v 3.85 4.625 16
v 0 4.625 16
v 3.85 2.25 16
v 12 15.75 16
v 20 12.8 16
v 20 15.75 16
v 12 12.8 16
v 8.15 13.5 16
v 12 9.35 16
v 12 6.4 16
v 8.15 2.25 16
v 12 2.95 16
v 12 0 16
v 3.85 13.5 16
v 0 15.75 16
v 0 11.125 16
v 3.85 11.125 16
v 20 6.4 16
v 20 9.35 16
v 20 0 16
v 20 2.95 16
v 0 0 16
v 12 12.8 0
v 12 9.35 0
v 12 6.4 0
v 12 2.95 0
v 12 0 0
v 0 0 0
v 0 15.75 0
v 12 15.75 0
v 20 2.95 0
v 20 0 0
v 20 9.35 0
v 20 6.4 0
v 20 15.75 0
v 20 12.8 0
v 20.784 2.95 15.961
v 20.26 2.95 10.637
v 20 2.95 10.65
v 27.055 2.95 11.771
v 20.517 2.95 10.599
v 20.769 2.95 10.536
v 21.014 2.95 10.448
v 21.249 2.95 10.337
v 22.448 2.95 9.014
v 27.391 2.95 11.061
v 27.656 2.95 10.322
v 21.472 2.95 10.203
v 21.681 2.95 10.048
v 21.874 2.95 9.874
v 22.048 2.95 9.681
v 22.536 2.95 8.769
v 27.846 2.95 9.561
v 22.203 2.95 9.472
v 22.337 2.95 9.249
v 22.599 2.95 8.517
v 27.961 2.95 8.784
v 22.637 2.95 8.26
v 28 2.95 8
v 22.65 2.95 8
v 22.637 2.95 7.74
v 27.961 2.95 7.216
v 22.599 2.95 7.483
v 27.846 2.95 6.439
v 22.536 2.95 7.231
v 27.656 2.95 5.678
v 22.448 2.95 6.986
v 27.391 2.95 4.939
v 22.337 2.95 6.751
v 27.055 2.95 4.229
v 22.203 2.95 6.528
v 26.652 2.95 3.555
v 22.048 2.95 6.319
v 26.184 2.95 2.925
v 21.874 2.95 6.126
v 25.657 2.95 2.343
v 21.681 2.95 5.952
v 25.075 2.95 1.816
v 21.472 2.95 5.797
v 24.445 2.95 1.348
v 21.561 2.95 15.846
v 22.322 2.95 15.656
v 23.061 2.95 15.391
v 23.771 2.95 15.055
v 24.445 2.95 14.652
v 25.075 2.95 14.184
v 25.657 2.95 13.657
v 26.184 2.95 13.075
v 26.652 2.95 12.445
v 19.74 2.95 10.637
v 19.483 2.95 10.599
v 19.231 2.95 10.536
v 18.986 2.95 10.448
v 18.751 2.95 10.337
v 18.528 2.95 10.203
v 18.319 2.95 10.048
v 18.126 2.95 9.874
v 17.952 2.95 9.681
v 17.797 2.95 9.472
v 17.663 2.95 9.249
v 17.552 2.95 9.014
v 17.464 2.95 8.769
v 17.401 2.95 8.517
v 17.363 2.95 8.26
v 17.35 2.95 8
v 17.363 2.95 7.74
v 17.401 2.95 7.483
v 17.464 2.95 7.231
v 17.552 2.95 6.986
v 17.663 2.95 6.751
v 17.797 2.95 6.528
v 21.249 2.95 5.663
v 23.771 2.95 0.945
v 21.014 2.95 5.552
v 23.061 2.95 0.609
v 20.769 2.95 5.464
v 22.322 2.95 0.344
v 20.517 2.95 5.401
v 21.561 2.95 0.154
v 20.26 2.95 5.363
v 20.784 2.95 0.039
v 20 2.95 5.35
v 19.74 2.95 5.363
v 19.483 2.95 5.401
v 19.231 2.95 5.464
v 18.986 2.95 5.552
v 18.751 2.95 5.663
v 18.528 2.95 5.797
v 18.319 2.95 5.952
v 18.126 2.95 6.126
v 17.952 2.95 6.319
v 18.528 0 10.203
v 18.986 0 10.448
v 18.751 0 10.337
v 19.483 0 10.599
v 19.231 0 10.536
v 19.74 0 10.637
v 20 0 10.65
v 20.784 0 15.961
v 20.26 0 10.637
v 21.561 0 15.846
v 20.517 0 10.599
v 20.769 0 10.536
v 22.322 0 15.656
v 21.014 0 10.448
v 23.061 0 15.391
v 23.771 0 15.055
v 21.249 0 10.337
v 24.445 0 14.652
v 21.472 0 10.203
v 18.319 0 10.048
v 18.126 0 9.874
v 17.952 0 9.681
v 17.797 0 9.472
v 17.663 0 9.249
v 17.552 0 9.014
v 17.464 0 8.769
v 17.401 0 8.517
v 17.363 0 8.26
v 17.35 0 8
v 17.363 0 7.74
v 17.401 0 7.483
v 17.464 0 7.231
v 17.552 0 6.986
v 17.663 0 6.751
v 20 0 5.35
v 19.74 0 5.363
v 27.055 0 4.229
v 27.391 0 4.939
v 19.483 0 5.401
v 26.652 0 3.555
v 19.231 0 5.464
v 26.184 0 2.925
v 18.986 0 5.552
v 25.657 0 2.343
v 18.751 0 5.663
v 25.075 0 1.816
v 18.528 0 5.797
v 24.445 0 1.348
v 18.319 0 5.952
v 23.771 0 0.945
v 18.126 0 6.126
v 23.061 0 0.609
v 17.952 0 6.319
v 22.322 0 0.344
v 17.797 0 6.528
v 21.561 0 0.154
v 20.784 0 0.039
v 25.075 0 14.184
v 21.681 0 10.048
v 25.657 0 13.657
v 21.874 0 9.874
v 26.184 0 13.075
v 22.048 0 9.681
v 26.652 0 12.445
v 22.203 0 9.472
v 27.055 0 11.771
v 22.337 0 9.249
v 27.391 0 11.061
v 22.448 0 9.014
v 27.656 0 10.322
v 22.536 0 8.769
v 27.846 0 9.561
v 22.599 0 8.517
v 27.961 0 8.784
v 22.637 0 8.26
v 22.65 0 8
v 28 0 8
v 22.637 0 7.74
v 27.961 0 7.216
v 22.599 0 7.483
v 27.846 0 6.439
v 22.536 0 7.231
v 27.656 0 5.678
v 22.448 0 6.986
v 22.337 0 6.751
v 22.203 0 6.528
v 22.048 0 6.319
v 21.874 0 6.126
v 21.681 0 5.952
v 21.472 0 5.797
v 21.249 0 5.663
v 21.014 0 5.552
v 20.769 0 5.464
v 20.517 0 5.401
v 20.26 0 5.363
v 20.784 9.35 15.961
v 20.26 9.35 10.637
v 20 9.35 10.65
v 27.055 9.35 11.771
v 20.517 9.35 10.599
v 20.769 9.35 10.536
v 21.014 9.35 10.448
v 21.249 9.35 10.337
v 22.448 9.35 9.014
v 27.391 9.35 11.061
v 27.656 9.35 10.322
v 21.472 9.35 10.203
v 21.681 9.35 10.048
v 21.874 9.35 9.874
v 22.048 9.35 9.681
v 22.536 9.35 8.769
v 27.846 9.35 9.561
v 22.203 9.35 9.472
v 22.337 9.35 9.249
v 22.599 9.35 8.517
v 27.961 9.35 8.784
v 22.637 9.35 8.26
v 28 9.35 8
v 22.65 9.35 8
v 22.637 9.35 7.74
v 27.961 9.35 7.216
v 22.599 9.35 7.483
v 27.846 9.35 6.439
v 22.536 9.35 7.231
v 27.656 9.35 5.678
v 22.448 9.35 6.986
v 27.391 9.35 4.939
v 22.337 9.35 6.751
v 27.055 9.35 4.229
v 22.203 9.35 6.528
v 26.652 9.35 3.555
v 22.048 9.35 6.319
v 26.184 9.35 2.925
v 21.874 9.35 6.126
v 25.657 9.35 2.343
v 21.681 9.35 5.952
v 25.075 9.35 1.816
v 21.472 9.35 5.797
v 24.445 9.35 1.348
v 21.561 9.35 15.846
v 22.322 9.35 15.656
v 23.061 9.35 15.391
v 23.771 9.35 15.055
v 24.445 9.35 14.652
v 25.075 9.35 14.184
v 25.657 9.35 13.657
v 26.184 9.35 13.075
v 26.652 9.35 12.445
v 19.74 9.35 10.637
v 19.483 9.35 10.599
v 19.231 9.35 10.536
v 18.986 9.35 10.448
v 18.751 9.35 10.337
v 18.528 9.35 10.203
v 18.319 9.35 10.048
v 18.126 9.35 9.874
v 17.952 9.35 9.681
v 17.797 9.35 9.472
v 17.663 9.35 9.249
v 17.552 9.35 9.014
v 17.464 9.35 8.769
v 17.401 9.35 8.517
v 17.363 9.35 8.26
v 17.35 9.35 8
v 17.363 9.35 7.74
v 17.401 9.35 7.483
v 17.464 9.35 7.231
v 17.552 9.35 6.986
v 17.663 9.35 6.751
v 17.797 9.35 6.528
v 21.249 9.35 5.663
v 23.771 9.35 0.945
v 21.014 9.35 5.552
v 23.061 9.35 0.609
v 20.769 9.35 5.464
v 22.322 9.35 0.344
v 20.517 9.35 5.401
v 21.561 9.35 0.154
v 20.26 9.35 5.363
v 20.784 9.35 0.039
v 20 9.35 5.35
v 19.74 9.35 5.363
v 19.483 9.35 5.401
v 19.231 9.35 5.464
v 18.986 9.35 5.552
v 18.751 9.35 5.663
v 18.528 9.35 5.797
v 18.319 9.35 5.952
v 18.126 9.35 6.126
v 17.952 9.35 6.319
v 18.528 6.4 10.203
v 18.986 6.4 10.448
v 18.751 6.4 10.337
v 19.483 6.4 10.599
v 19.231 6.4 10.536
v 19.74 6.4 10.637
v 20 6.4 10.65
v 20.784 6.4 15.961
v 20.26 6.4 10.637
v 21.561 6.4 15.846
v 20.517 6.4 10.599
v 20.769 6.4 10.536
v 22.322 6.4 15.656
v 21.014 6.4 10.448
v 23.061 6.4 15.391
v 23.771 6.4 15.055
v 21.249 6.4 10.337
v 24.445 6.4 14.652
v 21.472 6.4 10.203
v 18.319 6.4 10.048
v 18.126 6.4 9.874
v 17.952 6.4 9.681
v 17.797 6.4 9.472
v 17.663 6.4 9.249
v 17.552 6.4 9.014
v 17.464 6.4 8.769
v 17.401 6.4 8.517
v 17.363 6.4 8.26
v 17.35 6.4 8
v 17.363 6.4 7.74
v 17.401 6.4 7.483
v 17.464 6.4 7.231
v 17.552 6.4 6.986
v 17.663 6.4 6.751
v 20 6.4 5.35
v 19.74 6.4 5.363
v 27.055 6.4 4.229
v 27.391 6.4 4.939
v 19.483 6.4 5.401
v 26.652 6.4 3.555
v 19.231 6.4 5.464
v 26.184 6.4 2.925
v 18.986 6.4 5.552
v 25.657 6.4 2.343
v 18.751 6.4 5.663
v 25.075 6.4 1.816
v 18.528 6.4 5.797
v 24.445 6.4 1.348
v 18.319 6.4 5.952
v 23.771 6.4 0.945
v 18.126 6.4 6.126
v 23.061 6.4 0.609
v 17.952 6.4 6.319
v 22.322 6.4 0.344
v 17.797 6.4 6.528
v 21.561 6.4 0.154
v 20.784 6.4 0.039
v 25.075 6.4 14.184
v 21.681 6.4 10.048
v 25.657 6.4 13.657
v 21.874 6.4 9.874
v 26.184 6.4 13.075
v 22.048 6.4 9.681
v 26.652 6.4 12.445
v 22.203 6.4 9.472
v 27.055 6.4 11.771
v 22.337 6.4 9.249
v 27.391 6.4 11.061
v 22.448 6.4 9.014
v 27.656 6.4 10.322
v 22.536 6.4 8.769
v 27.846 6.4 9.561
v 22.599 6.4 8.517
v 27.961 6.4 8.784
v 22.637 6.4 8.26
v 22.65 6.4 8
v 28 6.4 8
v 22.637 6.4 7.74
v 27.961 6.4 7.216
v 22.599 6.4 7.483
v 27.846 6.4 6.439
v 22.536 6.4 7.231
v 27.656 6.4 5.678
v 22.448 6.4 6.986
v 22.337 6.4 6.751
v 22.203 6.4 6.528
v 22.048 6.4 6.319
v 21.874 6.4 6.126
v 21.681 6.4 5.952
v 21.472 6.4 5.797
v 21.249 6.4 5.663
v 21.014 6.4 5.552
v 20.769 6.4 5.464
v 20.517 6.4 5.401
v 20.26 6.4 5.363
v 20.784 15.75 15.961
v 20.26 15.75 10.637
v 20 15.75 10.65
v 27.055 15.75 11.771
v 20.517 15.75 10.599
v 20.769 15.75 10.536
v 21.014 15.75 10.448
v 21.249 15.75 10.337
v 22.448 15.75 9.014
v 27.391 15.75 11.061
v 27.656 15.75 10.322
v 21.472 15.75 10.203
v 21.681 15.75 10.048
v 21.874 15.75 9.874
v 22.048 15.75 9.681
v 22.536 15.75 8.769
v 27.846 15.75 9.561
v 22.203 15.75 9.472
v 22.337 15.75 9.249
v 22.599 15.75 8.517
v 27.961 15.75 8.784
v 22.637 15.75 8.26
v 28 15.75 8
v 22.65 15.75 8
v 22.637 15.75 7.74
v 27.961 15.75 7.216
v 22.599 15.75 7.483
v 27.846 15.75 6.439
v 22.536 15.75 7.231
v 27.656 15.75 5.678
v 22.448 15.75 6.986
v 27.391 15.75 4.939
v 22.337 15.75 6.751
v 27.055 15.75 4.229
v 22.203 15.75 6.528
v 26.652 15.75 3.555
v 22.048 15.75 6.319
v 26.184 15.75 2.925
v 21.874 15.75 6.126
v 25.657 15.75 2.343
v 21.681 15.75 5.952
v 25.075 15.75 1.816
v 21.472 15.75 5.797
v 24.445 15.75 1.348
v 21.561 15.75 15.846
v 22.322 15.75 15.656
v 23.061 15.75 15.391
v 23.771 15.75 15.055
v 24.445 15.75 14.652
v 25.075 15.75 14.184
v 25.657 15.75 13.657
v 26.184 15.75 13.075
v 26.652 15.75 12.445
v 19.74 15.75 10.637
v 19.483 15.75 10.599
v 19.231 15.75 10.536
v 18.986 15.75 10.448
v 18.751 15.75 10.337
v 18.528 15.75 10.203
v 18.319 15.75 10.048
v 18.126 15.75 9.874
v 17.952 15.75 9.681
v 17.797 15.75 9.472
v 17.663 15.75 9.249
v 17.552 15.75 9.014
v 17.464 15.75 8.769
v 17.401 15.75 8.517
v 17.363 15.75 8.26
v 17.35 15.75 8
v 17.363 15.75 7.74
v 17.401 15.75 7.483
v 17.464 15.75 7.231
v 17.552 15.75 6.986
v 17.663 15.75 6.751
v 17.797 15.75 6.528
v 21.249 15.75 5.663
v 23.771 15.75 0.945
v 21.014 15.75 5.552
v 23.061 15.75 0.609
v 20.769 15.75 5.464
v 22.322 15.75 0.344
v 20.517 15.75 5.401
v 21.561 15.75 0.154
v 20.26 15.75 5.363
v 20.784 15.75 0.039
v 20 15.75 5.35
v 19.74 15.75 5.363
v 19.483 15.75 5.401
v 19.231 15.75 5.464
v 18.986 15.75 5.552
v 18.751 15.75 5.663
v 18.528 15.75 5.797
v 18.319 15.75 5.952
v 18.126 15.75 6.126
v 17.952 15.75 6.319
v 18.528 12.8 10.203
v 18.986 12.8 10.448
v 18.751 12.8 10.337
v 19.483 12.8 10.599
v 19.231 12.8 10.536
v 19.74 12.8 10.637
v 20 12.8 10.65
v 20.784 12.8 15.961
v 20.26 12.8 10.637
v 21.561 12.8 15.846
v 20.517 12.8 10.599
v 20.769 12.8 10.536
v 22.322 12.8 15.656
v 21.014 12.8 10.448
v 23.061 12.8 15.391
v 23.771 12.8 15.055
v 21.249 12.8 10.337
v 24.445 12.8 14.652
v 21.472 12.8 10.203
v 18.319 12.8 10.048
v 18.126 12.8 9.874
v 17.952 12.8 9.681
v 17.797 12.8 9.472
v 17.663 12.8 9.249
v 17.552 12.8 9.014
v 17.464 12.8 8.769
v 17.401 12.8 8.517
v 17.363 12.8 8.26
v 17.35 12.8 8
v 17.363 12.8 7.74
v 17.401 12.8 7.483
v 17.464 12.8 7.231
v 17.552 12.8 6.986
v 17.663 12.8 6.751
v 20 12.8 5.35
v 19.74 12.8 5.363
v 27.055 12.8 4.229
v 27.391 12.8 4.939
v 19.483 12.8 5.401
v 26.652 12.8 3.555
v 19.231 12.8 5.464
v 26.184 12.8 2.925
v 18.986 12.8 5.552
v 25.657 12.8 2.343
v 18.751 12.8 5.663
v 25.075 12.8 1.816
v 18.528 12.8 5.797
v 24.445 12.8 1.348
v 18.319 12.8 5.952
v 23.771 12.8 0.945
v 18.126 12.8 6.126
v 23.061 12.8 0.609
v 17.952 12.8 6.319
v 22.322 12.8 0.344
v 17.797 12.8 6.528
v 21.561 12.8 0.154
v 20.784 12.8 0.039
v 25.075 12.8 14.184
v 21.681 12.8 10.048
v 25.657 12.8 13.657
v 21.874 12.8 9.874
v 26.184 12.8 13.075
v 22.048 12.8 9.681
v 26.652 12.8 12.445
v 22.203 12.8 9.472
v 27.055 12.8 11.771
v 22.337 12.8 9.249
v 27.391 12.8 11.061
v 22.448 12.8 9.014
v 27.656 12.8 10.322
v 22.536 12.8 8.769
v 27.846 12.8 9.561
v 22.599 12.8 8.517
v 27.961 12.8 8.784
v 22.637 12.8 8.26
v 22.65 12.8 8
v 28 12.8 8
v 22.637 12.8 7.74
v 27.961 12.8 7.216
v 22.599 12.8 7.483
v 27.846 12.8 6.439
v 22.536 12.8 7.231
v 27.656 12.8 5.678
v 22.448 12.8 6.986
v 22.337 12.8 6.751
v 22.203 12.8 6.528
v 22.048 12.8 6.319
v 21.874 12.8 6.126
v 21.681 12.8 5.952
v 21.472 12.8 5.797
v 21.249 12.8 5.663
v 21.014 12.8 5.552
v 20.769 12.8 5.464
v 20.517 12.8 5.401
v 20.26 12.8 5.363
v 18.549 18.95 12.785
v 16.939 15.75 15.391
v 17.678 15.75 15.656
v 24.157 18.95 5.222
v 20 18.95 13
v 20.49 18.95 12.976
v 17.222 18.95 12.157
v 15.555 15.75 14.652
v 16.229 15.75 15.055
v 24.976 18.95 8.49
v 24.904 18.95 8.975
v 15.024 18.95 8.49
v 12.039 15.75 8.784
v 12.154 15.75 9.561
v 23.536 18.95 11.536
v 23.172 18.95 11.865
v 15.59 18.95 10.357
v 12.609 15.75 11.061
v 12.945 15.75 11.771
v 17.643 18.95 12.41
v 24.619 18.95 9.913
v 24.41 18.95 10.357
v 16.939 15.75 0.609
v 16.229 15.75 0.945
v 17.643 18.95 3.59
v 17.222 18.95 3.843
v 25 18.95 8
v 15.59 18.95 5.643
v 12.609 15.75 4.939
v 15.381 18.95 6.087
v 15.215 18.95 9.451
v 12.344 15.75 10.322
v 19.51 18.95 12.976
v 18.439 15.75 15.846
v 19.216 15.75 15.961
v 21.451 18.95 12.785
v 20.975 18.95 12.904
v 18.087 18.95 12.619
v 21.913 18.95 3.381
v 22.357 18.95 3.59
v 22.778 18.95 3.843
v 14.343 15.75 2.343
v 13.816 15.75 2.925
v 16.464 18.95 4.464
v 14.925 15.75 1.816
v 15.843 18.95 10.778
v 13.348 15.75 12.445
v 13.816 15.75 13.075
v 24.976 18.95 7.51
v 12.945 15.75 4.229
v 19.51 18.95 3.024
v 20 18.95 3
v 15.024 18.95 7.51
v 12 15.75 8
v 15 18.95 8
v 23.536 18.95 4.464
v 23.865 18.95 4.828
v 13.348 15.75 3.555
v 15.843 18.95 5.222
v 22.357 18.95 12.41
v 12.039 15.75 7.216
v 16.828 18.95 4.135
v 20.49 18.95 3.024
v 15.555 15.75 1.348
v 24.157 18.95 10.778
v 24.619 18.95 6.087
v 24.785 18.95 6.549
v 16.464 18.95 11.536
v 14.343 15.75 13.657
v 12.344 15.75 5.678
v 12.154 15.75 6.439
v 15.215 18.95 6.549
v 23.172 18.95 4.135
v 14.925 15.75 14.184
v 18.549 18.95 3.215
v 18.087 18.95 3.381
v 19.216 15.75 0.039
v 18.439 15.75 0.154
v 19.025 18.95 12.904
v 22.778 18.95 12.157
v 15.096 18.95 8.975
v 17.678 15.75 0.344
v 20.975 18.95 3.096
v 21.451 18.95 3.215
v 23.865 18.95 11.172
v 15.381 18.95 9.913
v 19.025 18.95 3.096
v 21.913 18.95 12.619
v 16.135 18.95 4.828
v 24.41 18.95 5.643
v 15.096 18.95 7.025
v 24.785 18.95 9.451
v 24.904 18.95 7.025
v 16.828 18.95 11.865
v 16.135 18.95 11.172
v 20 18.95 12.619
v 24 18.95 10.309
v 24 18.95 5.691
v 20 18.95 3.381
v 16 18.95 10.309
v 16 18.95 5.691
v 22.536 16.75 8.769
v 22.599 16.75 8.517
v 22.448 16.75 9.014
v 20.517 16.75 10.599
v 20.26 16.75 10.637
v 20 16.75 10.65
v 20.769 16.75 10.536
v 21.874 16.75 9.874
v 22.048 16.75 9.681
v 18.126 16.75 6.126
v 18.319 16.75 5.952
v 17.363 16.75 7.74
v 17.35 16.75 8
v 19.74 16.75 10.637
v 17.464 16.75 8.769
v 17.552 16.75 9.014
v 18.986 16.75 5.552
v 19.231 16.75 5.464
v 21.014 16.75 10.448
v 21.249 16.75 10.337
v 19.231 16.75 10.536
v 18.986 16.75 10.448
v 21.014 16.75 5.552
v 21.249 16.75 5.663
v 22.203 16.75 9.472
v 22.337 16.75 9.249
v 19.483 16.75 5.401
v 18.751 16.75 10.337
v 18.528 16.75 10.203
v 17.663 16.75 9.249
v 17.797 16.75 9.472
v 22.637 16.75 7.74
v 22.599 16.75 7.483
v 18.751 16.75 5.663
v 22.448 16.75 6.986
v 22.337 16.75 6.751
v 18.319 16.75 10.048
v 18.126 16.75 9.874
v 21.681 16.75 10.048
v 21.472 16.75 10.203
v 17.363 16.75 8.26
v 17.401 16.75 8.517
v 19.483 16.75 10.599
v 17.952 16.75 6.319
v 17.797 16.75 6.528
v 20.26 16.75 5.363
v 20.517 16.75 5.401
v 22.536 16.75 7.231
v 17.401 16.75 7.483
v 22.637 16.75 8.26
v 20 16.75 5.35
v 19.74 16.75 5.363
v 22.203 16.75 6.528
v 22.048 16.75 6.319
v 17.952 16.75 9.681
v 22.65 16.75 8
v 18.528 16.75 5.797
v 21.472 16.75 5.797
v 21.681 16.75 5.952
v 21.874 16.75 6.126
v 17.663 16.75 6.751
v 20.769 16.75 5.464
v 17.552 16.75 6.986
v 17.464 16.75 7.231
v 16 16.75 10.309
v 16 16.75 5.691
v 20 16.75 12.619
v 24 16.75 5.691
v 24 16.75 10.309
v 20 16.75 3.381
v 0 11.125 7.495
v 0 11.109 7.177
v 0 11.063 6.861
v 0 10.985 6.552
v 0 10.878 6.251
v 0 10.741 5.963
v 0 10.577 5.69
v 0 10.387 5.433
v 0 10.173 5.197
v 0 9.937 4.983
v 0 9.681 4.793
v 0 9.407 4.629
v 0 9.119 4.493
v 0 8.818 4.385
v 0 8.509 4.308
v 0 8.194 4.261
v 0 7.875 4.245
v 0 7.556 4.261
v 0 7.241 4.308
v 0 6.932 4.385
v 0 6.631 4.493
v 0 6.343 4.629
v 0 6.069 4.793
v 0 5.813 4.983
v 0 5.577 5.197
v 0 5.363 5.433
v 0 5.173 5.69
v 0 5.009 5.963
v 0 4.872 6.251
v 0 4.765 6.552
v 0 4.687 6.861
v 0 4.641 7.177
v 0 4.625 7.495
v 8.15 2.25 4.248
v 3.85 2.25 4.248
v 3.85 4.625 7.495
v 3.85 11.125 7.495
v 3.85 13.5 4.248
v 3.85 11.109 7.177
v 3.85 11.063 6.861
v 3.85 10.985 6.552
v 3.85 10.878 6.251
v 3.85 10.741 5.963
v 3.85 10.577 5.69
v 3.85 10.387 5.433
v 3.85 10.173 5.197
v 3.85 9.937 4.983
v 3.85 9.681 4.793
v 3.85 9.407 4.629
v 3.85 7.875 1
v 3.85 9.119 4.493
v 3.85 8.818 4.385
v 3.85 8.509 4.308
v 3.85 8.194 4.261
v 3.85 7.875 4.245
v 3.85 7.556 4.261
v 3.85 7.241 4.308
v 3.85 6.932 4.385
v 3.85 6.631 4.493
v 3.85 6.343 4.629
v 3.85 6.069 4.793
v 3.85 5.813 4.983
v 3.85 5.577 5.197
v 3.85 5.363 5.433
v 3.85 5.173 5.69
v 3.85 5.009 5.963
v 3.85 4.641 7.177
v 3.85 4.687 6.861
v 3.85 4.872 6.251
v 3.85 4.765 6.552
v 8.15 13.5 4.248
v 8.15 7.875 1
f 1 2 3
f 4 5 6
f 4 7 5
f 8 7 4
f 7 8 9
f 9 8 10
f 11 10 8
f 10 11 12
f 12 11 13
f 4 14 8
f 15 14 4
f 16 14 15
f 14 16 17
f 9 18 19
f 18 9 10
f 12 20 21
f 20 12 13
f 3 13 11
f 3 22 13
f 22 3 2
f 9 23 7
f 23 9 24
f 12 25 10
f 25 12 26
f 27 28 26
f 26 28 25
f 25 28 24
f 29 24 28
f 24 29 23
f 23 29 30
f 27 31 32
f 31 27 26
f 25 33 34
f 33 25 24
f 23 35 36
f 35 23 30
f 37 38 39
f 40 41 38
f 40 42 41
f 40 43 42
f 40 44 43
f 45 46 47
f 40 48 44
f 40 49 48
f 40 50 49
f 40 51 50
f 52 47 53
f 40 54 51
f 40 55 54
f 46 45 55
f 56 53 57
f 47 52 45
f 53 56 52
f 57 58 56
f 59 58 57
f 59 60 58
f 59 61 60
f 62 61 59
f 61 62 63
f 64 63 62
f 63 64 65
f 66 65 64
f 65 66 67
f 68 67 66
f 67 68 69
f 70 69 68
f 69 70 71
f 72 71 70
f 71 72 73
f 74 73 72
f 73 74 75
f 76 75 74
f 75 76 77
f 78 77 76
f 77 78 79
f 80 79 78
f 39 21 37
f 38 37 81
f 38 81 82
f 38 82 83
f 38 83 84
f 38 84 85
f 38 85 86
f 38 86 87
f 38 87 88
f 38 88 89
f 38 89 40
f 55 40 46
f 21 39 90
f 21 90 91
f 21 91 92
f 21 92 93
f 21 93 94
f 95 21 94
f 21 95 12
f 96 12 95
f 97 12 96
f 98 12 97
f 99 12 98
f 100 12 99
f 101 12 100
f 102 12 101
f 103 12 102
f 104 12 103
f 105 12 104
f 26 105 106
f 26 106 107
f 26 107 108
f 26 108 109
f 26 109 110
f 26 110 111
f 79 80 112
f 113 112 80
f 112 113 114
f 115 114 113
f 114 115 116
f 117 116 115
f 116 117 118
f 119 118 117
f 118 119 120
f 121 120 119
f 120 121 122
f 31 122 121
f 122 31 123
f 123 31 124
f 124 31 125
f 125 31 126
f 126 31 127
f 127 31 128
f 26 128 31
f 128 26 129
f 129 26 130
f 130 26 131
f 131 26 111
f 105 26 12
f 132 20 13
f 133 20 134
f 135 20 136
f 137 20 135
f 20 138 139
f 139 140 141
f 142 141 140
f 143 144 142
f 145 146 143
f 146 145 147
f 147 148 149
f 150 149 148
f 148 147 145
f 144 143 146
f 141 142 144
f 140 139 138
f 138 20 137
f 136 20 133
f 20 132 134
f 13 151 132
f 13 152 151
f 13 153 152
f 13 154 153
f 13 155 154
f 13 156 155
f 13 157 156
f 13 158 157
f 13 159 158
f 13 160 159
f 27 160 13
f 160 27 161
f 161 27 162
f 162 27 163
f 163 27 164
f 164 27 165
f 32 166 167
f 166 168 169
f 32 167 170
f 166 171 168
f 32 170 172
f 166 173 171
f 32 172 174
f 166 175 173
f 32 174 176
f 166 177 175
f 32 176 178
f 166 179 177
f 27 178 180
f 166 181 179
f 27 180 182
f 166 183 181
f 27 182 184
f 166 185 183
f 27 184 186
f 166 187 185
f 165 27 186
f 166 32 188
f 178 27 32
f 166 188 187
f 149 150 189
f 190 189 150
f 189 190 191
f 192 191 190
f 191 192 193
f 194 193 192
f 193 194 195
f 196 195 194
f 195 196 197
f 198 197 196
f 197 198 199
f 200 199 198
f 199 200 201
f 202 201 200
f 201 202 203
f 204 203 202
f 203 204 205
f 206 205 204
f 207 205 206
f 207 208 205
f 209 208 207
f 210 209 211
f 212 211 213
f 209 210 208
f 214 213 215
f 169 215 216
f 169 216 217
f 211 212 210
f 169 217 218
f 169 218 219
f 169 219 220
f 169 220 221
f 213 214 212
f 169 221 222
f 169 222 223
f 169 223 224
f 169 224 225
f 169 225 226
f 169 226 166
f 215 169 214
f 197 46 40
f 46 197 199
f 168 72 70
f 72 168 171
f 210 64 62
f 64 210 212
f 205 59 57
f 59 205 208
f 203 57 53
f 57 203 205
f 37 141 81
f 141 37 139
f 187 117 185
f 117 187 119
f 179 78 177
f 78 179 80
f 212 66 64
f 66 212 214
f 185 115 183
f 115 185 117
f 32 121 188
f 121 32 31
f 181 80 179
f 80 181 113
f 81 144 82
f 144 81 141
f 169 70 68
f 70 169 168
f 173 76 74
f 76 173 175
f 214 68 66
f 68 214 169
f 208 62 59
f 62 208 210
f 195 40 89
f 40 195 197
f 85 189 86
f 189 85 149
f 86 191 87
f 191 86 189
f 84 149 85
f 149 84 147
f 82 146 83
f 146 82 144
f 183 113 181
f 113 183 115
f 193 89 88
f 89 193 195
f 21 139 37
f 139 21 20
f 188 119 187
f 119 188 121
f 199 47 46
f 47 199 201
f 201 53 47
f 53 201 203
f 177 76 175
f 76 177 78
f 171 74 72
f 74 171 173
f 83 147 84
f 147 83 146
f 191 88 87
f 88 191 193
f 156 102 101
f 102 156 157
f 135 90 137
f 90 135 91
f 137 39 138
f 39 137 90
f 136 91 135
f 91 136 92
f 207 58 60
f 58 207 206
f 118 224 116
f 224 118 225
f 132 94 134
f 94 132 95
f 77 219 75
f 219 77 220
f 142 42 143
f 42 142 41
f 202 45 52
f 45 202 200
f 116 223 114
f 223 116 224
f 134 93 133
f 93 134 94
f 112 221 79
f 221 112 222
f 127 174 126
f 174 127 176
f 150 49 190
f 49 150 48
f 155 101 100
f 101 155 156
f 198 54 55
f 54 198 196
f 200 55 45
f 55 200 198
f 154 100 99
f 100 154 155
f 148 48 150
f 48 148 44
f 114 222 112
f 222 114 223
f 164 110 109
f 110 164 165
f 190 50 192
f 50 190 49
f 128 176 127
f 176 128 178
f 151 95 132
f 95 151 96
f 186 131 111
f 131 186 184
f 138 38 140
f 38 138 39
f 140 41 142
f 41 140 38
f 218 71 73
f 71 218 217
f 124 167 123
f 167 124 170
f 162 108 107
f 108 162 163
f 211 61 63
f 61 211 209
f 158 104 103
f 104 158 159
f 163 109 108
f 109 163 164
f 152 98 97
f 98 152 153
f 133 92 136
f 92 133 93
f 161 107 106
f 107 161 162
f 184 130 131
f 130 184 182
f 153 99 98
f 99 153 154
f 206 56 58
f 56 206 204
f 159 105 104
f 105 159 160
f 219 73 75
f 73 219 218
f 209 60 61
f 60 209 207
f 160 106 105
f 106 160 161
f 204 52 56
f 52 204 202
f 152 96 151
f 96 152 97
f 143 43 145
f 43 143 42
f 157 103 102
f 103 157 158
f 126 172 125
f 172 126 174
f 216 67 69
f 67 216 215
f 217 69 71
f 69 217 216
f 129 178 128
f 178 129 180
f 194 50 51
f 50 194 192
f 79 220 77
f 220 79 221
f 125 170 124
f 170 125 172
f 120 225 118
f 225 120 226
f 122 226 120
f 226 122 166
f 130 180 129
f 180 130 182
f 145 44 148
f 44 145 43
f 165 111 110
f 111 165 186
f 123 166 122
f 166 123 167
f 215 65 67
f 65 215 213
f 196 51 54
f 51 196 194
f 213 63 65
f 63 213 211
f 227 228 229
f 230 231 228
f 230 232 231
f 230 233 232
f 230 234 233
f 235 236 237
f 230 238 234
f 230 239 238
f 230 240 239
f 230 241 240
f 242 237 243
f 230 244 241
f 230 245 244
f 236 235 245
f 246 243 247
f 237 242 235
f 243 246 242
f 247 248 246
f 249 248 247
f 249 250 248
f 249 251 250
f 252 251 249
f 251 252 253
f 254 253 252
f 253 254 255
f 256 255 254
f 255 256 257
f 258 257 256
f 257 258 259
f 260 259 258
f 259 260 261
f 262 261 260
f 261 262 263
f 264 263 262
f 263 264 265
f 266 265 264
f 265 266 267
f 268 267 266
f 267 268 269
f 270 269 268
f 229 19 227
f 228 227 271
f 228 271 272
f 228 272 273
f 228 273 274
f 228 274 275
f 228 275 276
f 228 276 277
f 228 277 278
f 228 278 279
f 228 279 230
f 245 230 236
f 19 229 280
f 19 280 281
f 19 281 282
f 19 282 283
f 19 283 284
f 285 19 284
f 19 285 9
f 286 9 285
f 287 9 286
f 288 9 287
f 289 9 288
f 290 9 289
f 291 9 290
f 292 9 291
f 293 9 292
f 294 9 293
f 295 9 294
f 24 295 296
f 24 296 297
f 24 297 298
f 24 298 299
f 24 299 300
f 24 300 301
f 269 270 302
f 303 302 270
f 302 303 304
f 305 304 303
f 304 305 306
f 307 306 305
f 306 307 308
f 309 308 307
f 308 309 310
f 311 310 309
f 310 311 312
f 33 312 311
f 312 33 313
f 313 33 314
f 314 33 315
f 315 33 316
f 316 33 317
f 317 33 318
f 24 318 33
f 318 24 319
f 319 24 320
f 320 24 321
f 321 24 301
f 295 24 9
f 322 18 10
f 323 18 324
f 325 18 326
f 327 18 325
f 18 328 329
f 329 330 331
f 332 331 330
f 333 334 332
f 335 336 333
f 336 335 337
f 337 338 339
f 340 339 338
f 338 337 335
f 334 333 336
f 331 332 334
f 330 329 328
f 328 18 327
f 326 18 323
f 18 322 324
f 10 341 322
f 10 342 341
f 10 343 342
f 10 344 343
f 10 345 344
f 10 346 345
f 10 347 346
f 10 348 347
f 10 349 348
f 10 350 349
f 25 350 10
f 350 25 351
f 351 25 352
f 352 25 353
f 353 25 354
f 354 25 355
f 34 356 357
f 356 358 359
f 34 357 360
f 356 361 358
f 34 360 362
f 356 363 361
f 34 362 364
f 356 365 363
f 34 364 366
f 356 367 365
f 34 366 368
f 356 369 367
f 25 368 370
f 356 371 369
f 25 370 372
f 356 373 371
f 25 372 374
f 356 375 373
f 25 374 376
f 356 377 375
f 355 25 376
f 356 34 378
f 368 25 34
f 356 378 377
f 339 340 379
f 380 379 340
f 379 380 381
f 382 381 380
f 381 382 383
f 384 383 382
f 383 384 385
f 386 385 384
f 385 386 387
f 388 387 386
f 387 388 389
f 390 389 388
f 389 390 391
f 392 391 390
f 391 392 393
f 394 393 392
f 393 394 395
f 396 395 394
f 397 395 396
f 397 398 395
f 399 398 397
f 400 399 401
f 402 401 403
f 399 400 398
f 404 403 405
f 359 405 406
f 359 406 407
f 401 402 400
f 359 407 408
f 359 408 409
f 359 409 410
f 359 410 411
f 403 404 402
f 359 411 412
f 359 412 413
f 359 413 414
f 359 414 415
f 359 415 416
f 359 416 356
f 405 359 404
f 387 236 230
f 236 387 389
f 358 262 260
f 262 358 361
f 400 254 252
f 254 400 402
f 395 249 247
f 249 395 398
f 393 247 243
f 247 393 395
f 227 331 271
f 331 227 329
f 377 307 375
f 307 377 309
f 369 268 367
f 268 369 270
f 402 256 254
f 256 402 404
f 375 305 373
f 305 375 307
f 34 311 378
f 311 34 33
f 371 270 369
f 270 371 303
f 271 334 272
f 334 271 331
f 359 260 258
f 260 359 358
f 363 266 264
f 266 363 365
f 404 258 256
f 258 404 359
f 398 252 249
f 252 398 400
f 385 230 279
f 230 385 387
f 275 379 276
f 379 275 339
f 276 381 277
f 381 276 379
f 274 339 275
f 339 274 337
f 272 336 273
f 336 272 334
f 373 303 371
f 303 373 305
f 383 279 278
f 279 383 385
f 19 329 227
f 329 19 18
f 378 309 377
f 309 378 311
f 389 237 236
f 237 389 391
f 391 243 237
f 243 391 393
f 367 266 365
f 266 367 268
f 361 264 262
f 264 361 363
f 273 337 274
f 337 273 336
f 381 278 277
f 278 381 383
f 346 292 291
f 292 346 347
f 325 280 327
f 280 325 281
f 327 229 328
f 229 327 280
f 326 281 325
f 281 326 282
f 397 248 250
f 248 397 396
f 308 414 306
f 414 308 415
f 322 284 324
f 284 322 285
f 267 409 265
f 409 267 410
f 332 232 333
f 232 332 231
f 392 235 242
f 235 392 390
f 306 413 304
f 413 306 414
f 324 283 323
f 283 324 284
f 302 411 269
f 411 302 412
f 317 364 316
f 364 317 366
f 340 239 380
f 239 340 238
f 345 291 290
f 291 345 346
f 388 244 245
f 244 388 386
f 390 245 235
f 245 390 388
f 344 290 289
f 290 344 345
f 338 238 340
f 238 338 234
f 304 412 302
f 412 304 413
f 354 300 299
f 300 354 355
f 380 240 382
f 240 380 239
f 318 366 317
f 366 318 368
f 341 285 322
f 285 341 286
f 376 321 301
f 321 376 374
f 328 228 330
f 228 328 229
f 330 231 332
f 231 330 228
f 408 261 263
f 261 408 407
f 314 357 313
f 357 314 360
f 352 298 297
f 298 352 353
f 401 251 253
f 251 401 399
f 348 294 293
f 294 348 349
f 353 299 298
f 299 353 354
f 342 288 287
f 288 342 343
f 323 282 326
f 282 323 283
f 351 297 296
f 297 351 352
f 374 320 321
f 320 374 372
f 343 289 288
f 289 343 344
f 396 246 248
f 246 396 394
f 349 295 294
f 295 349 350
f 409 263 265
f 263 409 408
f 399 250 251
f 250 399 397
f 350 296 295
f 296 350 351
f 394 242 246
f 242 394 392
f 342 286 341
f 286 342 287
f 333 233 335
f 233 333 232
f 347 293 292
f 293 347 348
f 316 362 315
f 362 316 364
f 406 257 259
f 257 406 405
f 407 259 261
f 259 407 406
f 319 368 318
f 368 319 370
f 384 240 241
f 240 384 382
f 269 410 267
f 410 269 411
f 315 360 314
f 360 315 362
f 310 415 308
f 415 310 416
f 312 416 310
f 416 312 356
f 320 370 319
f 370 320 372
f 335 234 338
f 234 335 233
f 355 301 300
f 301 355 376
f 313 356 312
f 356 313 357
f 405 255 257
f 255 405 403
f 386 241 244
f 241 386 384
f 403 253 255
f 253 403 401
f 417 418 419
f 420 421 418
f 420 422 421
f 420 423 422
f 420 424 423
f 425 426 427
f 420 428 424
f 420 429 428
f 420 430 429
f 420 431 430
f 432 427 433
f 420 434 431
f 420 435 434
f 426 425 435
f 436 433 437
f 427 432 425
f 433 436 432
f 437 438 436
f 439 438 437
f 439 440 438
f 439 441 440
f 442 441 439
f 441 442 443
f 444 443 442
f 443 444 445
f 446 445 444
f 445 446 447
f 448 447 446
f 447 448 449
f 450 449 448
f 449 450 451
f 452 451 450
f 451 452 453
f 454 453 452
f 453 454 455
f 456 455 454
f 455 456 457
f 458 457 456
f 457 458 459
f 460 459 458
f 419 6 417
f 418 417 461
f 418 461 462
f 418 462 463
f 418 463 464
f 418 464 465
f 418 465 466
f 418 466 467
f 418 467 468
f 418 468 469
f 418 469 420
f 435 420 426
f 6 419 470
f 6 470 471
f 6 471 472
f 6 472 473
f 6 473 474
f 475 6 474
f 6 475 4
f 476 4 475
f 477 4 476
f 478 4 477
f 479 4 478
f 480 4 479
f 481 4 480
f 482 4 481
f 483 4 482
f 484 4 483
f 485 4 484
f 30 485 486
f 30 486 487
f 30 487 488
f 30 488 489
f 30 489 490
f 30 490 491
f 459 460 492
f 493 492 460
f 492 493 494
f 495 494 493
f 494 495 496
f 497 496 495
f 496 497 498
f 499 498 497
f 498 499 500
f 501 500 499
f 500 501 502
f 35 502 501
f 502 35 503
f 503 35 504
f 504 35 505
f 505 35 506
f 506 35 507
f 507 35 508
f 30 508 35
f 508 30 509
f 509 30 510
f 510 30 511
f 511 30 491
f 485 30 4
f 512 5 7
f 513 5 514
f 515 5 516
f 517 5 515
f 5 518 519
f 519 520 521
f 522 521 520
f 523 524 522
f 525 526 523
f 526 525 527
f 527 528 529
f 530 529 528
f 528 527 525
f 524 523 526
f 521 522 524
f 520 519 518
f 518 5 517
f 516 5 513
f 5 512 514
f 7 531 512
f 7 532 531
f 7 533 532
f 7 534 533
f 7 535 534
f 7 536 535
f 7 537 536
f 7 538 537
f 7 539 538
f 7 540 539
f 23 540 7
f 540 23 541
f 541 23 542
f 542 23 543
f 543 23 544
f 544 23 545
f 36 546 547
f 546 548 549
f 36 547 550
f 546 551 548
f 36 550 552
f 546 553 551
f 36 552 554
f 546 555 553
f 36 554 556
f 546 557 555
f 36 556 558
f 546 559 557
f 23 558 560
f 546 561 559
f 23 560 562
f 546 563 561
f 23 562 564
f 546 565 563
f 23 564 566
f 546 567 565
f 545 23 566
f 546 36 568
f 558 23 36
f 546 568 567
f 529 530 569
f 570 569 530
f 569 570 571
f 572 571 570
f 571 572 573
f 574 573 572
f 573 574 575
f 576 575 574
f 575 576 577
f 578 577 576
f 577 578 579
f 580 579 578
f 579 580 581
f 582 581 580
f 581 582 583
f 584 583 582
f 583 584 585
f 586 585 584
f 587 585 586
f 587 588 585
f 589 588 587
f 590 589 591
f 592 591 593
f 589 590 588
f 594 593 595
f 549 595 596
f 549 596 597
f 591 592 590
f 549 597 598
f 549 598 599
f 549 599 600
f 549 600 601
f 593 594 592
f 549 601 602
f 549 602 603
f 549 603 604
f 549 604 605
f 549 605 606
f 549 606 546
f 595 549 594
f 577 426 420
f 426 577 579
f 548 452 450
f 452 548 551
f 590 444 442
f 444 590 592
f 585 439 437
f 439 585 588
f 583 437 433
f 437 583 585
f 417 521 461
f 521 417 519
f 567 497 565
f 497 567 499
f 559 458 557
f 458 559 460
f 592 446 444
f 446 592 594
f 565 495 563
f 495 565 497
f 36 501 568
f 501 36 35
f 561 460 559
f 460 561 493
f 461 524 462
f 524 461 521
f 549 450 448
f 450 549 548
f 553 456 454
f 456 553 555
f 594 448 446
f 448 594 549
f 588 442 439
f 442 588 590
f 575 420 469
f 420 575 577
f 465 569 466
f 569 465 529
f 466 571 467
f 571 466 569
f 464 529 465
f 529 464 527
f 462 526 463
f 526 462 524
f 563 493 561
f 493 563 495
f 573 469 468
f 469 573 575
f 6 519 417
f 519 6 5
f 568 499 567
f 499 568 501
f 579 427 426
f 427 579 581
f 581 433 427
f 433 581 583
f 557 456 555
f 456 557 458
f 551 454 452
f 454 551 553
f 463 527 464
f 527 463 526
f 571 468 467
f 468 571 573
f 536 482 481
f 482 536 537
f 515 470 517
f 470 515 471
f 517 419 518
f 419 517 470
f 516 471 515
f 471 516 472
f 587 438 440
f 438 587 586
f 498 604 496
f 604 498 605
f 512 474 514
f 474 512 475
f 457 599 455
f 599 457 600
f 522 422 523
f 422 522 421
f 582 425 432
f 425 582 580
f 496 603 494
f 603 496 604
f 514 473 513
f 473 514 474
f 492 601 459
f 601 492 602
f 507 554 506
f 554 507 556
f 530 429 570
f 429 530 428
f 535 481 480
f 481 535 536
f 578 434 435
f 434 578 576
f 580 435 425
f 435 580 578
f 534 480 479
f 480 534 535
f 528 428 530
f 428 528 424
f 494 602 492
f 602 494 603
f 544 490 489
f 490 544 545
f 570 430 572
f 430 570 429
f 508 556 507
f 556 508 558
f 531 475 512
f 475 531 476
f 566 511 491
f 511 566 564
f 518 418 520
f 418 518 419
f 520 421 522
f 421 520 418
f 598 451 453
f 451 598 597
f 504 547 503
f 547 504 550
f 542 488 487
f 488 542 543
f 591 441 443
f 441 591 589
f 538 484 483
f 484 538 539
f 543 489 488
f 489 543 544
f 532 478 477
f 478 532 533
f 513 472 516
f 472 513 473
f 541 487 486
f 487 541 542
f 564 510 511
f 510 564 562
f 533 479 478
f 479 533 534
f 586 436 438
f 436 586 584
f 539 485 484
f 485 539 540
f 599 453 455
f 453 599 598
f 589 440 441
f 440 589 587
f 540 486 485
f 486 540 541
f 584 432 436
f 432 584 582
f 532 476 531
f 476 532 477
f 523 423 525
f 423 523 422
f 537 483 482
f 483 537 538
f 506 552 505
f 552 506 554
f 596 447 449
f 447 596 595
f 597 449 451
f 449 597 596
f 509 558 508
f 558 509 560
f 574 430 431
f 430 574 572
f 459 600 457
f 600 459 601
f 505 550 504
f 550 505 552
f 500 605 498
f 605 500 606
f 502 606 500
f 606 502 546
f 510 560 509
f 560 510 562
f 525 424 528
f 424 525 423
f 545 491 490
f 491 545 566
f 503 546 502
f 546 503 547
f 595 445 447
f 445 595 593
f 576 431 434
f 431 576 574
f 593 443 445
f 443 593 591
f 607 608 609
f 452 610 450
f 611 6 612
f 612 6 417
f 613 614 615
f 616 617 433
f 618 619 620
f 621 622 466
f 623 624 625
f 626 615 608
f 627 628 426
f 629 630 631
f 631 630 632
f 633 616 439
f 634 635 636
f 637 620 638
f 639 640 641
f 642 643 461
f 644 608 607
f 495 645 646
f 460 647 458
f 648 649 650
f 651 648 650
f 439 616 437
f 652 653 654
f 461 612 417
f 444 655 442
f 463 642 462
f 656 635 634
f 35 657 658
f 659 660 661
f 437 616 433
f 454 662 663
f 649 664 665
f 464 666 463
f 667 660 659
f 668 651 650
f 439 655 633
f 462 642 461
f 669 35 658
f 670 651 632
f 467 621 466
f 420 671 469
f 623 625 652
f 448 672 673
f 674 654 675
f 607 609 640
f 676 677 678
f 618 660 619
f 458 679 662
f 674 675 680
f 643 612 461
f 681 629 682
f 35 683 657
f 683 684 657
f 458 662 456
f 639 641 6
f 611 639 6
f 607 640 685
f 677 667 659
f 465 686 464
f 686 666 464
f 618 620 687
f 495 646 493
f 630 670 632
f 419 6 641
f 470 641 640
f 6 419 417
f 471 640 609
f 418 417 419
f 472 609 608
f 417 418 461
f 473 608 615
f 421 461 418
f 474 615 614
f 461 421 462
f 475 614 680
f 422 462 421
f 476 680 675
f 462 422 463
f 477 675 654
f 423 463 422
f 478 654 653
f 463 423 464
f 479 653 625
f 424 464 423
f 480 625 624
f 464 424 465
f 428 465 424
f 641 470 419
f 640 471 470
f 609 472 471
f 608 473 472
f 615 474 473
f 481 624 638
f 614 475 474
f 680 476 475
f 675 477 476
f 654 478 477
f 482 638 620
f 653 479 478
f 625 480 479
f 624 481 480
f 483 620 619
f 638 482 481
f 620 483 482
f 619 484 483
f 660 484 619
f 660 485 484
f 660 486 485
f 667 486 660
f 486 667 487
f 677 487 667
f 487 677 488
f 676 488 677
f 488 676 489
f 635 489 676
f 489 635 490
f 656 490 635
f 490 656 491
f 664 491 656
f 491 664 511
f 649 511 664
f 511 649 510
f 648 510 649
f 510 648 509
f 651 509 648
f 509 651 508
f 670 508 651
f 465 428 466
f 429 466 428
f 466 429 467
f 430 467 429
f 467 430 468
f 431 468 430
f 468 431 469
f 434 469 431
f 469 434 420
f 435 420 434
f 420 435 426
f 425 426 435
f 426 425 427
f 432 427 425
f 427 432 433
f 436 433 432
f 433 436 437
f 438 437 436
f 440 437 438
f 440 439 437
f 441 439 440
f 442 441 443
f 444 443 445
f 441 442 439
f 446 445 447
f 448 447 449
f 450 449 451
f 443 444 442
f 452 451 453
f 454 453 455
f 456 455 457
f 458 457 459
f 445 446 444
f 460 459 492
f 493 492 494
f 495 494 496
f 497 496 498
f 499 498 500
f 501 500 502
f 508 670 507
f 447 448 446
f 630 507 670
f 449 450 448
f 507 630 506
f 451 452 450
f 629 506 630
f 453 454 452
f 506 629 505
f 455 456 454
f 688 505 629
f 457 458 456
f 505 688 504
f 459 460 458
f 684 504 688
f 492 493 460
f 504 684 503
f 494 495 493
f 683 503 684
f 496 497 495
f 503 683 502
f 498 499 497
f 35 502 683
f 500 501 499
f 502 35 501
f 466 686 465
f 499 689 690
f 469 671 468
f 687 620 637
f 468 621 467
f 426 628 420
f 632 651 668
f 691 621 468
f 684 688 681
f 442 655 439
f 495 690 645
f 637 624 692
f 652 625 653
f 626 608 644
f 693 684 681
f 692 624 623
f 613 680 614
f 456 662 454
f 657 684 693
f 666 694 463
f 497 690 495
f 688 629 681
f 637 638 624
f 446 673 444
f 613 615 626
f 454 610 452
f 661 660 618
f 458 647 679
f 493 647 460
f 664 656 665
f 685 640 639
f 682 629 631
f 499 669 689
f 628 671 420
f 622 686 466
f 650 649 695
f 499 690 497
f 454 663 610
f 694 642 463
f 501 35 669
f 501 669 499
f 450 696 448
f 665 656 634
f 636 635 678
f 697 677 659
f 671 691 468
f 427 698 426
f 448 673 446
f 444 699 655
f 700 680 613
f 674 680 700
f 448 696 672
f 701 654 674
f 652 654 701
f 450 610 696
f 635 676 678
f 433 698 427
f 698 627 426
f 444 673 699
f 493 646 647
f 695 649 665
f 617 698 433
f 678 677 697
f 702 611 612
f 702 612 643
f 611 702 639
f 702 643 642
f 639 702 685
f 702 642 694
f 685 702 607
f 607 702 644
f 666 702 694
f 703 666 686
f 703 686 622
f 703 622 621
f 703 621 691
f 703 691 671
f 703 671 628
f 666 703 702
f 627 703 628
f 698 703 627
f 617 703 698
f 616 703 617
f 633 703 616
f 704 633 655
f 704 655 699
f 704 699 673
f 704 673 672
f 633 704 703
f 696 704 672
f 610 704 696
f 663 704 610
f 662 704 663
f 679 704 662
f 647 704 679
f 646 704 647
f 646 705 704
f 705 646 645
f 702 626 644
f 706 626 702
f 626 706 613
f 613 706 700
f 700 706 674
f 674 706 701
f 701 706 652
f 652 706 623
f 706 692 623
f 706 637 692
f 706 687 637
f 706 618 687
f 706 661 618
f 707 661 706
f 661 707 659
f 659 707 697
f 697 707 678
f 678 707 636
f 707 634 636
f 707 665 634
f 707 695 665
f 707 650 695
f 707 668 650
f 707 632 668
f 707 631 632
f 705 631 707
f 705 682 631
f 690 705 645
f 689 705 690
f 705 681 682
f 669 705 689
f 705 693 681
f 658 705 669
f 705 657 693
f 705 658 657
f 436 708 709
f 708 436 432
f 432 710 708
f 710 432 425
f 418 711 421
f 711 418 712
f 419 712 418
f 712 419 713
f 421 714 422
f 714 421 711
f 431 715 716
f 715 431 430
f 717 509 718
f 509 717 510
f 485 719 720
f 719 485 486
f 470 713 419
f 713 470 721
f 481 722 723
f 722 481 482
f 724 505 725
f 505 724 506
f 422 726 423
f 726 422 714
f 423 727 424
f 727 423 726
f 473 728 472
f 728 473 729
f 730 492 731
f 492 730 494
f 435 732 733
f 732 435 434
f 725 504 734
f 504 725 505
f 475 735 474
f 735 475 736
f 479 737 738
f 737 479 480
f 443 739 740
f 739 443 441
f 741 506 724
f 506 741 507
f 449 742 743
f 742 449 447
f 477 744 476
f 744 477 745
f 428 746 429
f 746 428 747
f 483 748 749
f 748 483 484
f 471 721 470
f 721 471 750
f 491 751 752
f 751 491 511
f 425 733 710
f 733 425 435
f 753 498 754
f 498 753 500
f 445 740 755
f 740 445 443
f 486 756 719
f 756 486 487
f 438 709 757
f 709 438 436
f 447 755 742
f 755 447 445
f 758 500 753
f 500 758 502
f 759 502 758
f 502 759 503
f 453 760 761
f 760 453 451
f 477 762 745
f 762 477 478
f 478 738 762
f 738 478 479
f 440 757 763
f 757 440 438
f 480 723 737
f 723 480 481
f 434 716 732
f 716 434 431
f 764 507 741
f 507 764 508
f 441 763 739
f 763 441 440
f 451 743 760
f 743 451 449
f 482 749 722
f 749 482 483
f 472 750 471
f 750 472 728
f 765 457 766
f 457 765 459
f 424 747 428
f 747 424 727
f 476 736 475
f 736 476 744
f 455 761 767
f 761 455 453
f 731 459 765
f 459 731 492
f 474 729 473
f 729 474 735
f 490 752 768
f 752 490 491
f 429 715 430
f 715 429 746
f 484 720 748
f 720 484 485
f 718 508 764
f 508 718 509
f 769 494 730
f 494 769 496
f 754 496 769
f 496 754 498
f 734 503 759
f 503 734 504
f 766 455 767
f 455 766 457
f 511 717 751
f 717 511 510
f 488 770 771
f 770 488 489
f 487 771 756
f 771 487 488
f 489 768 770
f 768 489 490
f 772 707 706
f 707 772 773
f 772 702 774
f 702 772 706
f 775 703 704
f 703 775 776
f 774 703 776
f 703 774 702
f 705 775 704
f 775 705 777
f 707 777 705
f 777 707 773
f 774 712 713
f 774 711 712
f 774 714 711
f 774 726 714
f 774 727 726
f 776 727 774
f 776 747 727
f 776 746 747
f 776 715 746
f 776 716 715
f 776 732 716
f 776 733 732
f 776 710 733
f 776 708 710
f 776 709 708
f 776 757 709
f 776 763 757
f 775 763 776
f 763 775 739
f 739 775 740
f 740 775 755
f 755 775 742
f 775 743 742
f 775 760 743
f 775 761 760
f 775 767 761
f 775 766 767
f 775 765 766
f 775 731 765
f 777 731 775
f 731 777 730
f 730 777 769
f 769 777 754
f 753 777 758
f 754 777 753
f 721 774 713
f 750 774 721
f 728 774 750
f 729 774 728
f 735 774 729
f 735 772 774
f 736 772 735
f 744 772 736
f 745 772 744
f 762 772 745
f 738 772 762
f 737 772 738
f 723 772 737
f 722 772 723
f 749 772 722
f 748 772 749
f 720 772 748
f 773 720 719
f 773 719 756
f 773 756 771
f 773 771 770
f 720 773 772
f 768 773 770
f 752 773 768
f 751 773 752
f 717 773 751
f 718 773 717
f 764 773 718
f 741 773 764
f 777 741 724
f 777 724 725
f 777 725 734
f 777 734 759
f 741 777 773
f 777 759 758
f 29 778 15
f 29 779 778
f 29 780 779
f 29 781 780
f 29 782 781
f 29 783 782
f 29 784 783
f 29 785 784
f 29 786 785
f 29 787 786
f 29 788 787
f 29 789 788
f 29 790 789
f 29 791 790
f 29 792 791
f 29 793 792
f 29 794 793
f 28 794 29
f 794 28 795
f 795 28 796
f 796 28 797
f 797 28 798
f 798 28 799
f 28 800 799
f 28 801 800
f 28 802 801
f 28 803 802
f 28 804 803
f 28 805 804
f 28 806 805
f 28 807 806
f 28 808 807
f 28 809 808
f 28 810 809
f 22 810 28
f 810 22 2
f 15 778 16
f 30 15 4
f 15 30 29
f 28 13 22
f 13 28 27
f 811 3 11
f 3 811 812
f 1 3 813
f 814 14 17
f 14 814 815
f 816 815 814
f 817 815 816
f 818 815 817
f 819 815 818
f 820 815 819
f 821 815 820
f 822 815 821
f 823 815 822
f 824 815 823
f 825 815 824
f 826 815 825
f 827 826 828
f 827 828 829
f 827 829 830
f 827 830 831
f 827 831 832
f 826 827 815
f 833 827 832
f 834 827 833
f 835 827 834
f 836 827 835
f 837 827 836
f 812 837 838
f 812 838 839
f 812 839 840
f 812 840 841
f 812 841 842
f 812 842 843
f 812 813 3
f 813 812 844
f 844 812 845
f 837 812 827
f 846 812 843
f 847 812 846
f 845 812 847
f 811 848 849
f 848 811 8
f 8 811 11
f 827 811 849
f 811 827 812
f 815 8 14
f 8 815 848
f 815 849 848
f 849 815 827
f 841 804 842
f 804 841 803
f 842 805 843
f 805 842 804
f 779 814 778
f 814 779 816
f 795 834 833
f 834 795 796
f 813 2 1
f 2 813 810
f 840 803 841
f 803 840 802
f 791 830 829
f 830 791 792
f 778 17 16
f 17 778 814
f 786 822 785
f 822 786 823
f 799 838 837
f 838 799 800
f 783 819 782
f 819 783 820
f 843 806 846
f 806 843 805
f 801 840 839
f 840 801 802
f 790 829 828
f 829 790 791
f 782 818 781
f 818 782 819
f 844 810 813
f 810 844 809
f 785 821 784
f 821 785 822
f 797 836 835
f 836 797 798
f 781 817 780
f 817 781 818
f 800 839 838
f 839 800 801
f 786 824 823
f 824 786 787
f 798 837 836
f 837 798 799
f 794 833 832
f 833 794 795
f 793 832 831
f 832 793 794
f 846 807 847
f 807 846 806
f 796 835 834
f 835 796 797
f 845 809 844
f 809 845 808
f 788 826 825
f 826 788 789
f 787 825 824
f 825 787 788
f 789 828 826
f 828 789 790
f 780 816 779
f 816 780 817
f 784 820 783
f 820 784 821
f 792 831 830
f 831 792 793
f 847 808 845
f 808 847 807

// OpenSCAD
//GoPro to Tripod Mount

goPro_FinSpacing = 3.45;
goPro_FinWidth = 2.95;
goPro_MountThreeFinWidth = goPro_FinSpacing * 2 + goPro_FinWidth * 3;
goPro_MountTwoFinWidth = goPro_FinWidth * 3;

quarterTwentyNut_Radius = hexagonRadiusFromWidth(11.25);
quarterTwentyNut_Height = 5.6;
quarterTwentyBoltHead_Height = 4.3;

quarterTwenty_outerRadius = 3.25;

M5_outerRadius = 5.3 / 2;
M5Nut_Radius = hexagonRadiusFromWidth(8.0);

adaptor_Width = goPro_FinSpacing * 2 + goPro_FinWidth * 3;

goProToTripod(fins = "three");
//thumbScrew();

module thumbScrew() {
    difference() {
      cylinder( r = 15, h = quarterTwentyNut_Height + 2, $fn = 128 );
      translate([0,0,-1])
      cylinder( r = quarterTwenty_outerRadius + 1.0, h = quarterTwentyNut_Height + 3, $fn = 64 );
      translate([0, 0, 2]) {
        cylinder( r = quarterTwentyNut_Radius, h = quarterTwentyNut_Height, $fn = 6 );
      }    
      
      for( angle = [0:6]) {
        rotate([ 0, 0, angle * 60])
        translate( [33, 0, 0] )
          cylinder( r = 20, h = quarterTwentyNut_Height + 2, $fn = 64 );
      }
    }
}

module goProToTripod(fins = "three") {
  difference() {
    union() {
      cube([12, adaptor_Width, 16]);
      translate([12 + 8,0,8])
      rotate([0,-90,0]) {
        if( fins == "three" ) {
          goProThreeFinMount(wid = goPro_FinWidth, spacing = goPro_FinSpacing);
        } else {
          translate([ 0, goPro_FinWidth, 0 ])
            goProTwoFinMount(wid = goPro_FinWidth, spacing = goPro_FinSpacing);         
        }
      }
    }
    
    translate( [(12 - quarterTwentyBoltHead_Height) / 2, adaptor_Width / 2, quarterTwentyNut_Radius + 1]) {
      rotate([0,90,0]) 
      hull() {
        cylinder( r = quarterTwentyNut_Radius, h = quarterTwentyBoltHead_Height, $fn = 6 );
        translate( [-10, 0, 0] )
          cylinder( r = quarterTwentyNut_Radius, h = quarterTwentyBoltHead_Height, $fn = 6 );       
      }
      
      rotate([0,-90,0])
      hull() {
        cylinder( r = quarterTwenty_outerRadius, h = 10, $fn = 64 );
        translate( [10, 0, 0] )
          cylinder( r = quarterTwenty_outerRadius, h = 10, $fn = 64 );        
      } 
    }
  }
}

module goProThreeFinMount(wid = 3.0, spacing = 3.3) {
  goProFin(wid);
  for( i = [1:2]) {
    translate([0, (spacing + wid) * i, 0])
      goProFin(wid);   
  }

  translate([0, spacing * 2 + wid * 3, 0]) 
  rotate([-90, 0, 0]) 
  difference() { 
    cylinder(r1 = 8, r2 = 5, h = 3.2, $fn = 64);
    translate([0,0,-2])
      cylinder( r = M5_outerRadius, h = wid + 1, $fn = 64 );
    translate([0,0,1])
      cylinder(r = M5Nut_Radius, h = 3.5, $fn = 6);
  }
}

module goProTwoFinMount(wid = 3.0, spacing = 3.3) {
  goProFin(wid);
  translate([0, wid + spacing, 0])
    goProFin(wid); 
}

module goProFin(wid = 3.0) {
  translate([0, wid, 0])
  difference() {
    union() {
      translate([ -8, -wid, 0])
        cube([ 16, wid, 8]);
      rotate([ 90, 0, 0 ])
        cylinder( r = 8.0, h = wid, $fn = 64 );      
    }
    translate([0, 0.5, 0])
    rotate([ 90, 0, 0 ])
      cylinder( r = M5_outerRadius, h = wid + 1, $fn = 64 );
  }
}

module tripodMount(wid = quarterTwentyNut_Radius + 10) {
  outerRadius = hexagonRadiusFromWidth(wid);
  rotate( [0, 0, 30])
  difference() {
    cylinder( r = outerRadius, h = quarterTwentyNut_Height, $fn = 6 );
    cylinder( r = quarterTwentyNut_Radius, h = quarterTwentyNut_Height, $fn = 6 );
  }
}

function hexagonRadiusFromWidth( w ) = (w) / sqrt(3);
